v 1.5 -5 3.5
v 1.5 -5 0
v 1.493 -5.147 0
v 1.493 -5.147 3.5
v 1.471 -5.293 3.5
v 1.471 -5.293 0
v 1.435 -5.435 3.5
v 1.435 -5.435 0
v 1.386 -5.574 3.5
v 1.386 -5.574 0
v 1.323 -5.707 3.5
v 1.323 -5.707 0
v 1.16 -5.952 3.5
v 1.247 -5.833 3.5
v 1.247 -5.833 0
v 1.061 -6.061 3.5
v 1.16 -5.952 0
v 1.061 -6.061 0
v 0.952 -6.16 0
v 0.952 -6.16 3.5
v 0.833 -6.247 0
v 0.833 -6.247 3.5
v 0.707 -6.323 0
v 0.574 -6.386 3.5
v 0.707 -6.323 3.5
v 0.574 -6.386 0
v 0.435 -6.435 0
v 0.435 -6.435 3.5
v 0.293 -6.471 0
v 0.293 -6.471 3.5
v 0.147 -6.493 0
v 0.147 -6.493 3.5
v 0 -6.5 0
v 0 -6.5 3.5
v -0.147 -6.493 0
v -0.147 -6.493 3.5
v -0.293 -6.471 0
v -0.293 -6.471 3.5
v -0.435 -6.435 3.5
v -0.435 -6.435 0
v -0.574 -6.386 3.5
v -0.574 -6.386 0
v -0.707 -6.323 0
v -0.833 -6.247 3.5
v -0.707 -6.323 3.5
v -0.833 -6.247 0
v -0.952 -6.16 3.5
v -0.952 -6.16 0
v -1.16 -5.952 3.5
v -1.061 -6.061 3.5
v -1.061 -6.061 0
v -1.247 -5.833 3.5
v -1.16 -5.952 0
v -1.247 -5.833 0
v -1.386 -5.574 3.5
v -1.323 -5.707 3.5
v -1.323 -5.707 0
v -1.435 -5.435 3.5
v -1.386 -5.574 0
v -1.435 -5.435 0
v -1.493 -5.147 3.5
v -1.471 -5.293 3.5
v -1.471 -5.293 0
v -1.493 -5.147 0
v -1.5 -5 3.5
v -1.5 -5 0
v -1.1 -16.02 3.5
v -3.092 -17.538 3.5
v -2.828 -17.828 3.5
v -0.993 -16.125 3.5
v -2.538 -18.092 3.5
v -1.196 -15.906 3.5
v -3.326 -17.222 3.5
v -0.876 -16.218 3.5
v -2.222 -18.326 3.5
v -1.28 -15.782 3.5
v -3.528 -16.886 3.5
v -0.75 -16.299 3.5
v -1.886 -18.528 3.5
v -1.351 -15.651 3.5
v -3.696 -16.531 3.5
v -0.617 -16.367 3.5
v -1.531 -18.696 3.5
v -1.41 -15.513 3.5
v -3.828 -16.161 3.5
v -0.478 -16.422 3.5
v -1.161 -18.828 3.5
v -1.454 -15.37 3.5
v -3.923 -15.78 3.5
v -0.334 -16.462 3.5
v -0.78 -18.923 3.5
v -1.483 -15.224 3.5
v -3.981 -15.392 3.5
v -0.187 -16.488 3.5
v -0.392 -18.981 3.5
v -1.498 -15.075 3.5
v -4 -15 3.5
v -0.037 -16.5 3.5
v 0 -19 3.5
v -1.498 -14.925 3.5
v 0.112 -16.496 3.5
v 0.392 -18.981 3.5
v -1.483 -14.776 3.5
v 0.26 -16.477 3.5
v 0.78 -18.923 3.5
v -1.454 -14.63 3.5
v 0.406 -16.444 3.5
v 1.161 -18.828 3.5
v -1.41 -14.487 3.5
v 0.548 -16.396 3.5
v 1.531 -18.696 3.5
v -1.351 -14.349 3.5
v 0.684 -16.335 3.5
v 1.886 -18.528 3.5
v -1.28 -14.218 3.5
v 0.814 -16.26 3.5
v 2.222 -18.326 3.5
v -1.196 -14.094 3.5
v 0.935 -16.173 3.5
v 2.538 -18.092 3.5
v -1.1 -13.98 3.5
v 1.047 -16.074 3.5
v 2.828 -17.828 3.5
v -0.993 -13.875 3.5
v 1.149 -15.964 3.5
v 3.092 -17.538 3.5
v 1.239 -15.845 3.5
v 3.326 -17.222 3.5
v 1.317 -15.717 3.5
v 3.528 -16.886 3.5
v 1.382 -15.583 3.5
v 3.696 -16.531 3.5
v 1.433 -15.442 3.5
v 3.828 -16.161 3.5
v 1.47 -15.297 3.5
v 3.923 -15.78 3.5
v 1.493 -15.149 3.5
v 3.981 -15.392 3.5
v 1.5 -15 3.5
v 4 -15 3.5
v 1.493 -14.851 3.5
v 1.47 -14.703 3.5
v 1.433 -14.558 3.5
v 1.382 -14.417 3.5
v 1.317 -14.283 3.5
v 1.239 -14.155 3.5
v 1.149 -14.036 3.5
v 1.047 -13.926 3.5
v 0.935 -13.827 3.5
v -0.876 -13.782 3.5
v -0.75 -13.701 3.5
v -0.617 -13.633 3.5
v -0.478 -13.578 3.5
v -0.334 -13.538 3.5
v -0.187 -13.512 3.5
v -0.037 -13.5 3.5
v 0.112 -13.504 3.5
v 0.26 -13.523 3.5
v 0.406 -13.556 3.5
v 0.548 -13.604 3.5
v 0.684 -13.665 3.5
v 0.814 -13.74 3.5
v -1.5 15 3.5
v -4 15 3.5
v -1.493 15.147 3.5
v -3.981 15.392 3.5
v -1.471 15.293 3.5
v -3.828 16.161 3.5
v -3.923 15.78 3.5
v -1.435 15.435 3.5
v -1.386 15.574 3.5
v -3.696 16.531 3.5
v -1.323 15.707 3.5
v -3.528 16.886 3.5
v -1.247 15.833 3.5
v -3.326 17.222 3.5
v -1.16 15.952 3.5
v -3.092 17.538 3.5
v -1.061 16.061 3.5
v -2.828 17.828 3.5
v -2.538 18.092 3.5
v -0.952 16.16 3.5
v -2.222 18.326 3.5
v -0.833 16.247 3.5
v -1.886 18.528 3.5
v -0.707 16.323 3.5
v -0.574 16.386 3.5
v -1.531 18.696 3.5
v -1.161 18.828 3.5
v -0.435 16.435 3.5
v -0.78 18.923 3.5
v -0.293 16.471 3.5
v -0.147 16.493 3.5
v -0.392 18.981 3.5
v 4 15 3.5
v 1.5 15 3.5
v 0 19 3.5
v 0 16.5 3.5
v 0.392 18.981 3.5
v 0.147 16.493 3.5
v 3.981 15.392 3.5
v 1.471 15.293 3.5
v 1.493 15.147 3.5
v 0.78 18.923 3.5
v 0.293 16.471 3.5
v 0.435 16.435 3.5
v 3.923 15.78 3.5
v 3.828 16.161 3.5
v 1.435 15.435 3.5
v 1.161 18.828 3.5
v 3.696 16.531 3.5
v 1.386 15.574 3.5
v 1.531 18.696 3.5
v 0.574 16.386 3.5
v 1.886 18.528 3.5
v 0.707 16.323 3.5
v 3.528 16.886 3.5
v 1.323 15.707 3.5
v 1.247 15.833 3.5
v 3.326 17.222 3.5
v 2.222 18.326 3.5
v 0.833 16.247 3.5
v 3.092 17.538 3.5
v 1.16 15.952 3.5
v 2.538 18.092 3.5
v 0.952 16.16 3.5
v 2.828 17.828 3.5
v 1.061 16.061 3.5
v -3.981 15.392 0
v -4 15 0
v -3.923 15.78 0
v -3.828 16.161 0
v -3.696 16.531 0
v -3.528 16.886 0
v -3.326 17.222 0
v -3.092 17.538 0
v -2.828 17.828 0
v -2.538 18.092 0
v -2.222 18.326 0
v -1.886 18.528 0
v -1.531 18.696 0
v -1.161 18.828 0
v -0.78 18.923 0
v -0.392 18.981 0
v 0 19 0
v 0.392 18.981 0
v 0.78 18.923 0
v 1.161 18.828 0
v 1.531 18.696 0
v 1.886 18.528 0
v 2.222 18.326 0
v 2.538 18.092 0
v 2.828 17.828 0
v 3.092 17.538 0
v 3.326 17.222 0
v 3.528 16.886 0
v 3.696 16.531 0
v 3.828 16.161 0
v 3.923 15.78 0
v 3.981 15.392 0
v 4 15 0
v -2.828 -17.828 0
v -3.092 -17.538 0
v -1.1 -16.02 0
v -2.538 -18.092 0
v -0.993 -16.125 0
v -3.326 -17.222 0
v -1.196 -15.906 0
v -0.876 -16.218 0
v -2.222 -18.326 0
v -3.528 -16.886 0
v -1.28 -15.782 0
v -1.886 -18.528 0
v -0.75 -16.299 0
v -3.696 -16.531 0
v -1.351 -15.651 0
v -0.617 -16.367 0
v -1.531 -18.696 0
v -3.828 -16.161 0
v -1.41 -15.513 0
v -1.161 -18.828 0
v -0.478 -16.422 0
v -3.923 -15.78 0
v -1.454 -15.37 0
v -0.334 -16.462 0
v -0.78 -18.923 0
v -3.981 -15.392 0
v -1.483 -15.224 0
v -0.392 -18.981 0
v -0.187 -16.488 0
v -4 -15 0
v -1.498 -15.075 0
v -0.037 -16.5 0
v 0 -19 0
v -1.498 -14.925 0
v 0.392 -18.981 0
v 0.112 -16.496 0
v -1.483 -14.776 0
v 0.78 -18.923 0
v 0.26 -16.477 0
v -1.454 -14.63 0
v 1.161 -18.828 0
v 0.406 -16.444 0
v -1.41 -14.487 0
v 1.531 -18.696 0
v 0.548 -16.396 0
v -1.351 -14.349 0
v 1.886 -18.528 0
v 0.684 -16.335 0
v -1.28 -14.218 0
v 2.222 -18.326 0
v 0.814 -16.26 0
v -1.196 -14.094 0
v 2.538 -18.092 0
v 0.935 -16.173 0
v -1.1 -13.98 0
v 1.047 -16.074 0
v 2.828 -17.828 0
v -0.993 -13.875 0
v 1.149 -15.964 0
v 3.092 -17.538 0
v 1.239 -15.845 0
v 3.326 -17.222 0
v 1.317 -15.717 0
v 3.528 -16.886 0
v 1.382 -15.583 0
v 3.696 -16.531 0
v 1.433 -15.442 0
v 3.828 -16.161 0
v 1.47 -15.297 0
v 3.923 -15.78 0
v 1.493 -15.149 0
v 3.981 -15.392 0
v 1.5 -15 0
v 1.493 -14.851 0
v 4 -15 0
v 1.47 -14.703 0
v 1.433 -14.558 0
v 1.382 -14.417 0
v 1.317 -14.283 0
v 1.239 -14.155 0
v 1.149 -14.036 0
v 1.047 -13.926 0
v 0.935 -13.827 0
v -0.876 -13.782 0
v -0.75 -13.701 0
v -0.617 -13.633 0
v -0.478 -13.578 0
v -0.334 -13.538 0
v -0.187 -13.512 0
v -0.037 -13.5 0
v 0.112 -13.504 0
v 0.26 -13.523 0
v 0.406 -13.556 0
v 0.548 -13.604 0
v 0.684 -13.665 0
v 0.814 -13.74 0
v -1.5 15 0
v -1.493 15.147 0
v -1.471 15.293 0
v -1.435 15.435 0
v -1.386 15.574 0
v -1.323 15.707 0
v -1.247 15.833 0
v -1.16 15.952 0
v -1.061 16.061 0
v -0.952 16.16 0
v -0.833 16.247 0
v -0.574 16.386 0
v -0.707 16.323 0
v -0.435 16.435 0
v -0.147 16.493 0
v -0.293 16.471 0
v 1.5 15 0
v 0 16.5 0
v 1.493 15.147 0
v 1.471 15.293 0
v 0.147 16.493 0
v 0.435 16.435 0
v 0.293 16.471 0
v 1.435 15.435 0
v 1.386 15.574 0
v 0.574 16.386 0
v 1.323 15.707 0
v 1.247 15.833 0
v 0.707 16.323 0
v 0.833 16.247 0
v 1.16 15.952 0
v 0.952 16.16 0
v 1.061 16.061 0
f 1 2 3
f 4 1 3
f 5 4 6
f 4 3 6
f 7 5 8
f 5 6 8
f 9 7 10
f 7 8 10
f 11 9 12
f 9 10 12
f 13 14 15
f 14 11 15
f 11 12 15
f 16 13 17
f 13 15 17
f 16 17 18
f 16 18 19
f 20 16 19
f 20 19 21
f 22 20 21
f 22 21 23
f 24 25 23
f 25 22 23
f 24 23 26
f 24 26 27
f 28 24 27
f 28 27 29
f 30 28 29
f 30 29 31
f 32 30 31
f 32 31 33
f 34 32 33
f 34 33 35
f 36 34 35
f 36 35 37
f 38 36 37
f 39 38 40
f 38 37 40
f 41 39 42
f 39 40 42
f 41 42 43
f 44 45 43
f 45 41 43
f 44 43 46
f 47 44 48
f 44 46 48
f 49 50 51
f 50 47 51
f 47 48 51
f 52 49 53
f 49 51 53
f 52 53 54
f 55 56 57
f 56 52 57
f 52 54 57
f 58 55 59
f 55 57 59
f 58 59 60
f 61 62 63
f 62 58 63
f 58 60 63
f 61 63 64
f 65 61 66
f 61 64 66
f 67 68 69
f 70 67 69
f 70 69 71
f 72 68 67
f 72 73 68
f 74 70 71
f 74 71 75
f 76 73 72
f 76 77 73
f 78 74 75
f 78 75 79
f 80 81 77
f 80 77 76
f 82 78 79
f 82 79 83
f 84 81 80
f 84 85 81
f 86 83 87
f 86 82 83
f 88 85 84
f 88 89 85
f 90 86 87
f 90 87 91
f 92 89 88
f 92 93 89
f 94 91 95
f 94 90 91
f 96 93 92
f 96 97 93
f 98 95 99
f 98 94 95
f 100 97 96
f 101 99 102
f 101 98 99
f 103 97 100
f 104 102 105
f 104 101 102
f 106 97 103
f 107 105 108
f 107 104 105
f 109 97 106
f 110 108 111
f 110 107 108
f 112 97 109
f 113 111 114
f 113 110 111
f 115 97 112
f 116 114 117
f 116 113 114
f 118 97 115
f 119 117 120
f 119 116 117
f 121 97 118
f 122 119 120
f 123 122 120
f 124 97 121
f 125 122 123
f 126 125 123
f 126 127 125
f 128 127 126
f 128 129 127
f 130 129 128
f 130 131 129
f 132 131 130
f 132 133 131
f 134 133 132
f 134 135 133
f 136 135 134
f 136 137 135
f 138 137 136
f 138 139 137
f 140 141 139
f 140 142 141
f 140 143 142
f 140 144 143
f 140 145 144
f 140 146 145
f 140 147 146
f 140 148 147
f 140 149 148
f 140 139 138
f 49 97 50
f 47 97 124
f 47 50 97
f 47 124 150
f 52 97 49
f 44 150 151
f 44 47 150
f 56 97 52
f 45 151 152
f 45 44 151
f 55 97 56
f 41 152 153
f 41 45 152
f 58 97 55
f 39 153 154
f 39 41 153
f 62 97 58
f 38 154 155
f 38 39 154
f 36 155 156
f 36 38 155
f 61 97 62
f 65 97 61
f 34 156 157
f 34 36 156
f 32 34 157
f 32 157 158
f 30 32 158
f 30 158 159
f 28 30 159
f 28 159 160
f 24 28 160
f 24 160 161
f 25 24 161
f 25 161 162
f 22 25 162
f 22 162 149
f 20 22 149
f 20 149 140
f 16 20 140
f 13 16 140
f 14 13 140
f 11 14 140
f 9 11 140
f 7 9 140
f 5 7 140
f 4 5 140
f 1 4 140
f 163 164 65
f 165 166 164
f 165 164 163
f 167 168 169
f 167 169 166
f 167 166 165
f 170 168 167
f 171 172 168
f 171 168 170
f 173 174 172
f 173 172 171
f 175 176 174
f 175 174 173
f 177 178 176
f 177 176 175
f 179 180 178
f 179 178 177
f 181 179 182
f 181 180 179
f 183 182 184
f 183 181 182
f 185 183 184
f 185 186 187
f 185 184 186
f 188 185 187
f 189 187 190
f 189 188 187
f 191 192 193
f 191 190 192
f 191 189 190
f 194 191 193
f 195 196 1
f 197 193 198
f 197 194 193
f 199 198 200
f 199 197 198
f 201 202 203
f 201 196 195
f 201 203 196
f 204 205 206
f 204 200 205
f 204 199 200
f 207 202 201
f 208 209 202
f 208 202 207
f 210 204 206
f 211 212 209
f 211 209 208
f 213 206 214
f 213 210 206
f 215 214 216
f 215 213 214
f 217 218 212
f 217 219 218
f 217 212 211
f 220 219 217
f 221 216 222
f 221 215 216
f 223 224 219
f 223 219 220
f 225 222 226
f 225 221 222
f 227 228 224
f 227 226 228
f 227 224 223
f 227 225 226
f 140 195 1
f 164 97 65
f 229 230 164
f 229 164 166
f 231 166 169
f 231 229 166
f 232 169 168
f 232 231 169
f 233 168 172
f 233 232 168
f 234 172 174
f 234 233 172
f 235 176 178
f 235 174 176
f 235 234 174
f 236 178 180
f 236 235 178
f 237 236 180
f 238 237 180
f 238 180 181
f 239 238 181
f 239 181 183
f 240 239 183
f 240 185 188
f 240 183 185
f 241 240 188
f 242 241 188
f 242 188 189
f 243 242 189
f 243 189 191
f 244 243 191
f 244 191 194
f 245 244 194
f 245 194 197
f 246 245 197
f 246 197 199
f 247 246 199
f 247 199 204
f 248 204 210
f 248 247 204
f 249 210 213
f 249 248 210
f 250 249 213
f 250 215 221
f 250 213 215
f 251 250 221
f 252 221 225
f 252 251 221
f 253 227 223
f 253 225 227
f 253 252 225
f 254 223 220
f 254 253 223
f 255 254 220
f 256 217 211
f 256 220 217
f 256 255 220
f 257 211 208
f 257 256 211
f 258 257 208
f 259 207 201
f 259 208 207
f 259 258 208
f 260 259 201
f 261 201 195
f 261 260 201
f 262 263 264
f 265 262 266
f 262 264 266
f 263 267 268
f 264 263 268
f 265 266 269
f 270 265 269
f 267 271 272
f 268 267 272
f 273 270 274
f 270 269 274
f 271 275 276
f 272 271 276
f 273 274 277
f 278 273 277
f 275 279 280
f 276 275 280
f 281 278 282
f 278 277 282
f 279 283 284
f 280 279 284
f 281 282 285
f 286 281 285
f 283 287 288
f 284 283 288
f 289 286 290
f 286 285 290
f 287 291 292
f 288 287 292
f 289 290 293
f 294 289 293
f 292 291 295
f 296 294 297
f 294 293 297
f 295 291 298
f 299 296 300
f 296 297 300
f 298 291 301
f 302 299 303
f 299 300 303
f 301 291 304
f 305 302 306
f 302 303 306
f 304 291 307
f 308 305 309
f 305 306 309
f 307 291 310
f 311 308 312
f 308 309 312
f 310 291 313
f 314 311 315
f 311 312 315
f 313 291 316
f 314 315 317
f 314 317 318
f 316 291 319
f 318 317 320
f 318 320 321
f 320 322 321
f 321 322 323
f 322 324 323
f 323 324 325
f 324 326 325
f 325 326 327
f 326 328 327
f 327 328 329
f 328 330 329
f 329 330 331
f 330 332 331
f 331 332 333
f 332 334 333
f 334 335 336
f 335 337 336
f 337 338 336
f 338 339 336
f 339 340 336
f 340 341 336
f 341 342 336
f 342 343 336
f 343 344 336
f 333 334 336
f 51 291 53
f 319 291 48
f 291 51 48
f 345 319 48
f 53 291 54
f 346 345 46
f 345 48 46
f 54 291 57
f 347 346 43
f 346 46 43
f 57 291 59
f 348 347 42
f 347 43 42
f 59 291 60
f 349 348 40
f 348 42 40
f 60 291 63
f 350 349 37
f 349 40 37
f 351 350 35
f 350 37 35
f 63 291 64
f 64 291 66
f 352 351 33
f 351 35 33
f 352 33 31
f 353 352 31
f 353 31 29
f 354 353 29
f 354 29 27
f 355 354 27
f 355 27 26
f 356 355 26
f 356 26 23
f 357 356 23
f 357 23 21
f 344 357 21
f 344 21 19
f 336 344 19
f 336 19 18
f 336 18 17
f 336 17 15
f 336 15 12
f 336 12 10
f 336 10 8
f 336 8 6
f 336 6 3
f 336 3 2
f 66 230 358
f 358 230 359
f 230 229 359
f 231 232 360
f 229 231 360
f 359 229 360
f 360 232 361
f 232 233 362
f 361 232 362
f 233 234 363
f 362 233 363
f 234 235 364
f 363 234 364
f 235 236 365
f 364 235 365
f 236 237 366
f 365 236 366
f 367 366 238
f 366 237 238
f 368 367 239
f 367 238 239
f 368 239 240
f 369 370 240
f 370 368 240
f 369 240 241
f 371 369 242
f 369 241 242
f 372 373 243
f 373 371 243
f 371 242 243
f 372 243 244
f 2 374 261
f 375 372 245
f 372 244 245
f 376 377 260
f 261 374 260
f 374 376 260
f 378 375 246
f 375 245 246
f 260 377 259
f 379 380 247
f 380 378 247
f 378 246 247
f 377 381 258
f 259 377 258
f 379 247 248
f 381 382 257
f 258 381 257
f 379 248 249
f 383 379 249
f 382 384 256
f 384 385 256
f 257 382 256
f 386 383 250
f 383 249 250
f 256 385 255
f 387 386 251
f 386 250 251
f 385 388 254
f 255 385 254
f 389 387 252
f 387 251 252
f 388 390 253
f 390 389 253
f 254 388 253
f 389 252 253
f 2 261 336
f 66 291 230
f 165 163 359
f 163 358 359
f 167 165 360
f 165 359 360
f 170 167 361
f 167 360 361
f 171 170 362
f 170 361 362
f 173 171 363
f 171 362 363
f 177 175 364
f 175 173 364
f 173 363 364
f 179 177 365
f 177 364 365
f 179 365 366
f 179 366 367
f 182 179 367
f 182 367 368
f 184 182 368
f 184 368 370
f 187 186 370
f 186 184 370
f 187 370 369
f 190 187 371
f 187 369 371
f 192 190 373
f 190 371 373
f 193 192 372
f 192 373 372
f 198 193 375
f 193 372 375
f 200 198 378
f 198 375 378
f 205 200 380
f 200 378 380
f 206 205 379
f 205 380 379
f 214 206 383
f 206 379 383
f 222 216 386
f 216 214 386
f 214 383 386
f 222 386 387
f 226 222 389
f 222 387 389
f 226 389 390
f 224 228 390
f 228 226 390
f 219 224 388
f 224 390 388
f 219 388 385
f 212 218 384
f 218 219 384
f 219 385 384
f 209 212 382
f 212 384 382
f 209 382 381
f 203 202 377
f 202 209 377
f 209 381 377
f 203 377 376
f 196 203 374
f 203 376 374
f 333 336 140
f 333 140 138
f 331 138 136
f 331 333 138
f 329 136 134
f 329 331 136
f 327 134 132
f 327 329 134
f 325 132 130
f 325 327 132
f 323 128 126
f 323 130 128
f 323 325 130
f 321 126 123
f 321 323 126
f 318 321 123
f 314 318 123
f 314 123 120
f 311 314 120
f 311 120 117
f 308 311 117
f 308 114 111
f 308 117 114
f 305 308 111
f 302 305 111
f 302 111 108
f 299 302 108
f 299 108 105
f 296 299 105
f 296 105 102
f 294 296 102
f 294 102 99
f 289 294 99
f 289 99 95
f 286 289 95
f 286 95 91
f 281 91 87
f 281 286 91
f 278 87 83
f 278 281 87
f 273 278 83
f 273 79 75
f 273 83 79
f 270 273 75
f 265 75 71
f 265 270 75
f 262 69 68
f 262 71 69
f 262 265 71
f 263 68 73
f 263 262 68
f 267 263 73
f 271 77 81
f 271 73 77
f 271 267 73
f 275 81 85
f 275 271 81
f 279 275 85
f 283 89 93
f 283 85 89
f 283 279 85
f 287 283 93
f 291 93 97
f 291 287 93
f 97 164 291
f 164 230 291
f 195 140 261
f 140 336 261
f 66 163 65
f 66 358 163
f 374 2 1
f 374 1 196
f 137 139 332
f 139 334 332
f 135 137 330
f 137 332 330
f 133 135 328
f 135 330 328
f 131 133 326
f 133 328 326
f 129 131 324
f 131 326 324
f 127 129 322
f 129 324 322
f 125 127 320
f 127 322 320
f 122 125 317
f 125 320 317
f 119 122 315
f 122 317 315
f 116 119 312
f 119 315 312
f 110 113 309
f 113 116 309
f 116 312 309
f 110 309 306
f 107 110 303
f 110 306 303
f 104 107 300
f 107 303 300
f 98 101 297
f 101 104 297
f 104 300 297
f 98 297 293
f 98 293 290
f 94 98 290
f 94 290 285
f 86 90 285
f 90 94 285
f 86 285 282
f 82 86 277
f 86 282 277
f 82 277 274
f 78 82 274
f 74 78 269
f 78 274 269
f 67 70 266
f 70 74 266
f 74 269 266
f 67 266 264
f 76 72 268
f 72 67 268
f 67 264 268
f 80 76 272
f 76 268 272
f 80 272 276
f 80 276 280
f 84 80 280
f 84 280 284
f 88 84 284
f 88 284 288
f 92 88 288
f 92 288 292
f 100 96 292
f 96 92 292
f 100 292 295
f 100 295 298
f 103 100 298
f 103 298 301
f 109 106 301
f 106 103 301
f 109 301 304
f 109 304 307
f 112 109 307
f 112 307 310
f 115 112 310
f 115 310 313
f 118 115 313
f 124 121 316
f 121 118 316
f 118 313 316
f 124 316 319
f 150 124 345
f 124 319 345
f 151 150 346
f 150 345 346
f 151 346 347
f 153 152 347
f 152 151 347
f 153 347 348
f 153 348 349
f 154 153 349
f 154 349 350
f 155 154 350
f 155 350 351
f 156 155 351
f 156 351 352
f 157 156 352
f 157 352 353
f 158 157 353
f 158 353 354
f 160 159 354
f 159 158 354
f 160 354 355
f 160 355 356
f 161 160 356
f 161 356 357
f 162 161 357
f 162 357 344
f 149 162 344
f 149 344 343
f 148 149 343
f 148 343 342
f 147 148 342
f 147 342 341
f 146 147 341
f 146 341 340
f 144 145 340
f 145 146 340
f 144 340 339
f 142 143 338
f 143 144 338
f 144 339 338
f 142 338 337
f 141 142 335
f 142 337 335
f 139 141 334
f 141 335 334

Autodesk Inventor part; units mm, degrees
ref_plane "YZ Plane" through (0, 0, 0) normal (1, 0, 0) x (0, 1, 0)
ref_plane "XZ Plane" through (0, 0, 0) normal (0, 1, 0) x (-1, 0, 0)
ref_plane "XY Plane" through (0, 0, 0) normal (0, 0, 1) x (1, 0, 0)
sketch "Sketch1" plane through (0, 0, 0) normal (0, 0, 1) x (1, 0, 0)
  line L0 (0, 15) -> (0, -15) construction
  line L1 (-4, 15) -> (-4, -15)
  line L2 (4, -15) -> (4, 15)
  arc A0 (4, 15) -> (-4, 15) centre (0, 15) ccw
  arc A1 (-4, -15) -> (4, -15) centre (0, -15) ccw
  circle A2 centre (0, -15) radius 1.5
  line L3 (0, -5) -> (0, 15) construction
  line L4 (1.5, -5) -> (1.5, 15)
  line L5 (-1.5, 15) -> (-1.5, -5)
  arc A3 (-1.5, -5) -> (1.5, -5) centre (0, -5) ccw
  arc A4 (1.5, 15) -> (-1.5, 15) centre (0, 15) ccw
  point P0 (0, 0)
  point P1 (0, 5)
  dimension "d0" = 15
  dimension "d1" = 8
  dimension "d2" = 3
  dimension "d3" = 10
  dimension "d4" = 3
  dimension "d5" = 10
extrude "Extrusion1" add sketch "Sketch1" along normal blind 3.5
properties part number "3DP_PLA_Measurement_Rail_Mounting_Bracket_Short" material "ABS Plastic"
